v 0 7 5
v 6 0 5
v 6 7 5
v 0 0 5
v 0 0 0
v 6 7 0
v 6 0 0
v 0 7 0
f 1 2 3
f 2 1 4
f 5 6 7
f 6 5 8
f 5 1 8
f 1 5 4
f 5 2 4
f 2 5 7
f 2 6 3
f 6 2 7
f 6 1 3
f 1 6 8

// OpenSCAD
translate([1.0, 1.5, 2.5]) color([0.0037403702712440756, 0.2703277384724262, 0.6403732426441148]) cube([2, 3, 5], center=true);
translate([3.0, 1.5, 2.5]) color([0.29252642189785794, 0.9007258804640697, 0.14067978971908934]) cube([2, 3, 5], center=true);
translate([5.0, 1.5, 2.5]) color([0.5728503338092871, 0.1912043400515635, 0.43401891336511733]) cube([2, 3, 5], center=true);
translate([1.5, 4.0, 2.5]) color([0.7163457448050065, 0.3841301513333275, 0.33069552050314754]) cube([3, 2, 5], center=true);
translate([4.5, 4.0, 2.5]) color([0.6480049557775331, 0.6874717059379091, 0.14801928734251768]) cube([3, 2, 5], center=true);
translate([1.5, 6.0, 2.5]) color([0.93323205939552, 0.14750072005511716, 0.31607169754224296]) cube([3, 2, 5], center=true);
translate([4.5, 6.0, 2.5]) color([0.2088660889148145, 0.1868244368145192, 0.3491672112743387]) cube([3, 2, 5], center=true);
